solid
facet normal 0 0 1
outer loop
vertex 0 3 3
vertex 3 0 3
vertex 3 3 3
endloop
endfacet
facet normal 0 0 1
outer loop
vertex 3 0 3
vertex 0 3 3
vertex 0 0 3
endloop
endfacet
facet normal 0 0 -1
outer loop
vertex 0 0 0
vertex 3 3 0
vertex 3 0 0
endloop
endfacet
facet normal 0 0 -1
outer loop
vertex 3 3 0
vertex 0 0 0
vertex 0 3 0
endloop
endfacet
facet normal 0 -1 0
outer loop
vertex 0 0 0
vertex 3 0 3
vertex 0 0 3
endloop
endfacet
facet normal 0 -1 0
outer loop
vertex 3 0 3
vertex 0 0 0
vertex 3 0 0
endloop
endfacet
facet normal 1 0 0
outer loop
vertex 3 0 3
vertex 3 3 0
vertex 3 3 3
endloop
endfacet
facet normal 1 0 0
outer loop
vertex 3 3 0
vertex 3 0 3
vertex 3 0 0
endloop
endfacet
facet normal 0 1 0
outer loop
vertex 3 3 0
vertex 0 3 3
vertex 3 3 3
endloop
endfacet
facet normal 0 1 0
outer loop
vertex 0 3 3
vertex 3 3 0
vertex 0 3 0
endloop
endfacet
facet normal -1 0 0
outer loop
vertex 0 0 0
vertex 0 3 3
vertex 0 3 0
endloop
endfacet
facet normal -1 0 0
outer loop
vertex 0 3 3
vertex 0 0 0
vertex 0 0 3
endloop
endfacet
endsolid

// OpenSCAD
// SYMPTOM: a rotate_extrude(file="...") with an unopenable file aborted the WHOLE
//   import. t3d__rotate_extrude-angle opens with
//   `rotate_extrude(file="45", ... angle=360);` and died at parse with
//   `ValueError: Unsupported file extension `, losing the file's other 4 valid
//   rotate_extrude(angle=...) statements (Category C: a hard error, no STEP).
// CAUSE: file="45" is OpenSCAD's deprecated 2D-profile DXF-import form. The
//   importer split "45" -> filen="45", ext="" and called process_import_file,
//   which raises ValueError on the empty/unsupported extension (importCSG.py
//   ~L1014). The exception propagated out of p_rotate_extrude_file and killed
//   the whole document.
// FIX: importCSG.py p_rotate_extrude_file -> wrap process_import_file in
//   try/except (ValueError, FileNotFoundError): warn and render empty, mirroring
//   import()-of-a-missing-file and the childless-rotate_extrude path right above.
//   Commit 65223cb91b.
// EXPECTED (OpenSCAD): rotate_extrude with an unopenable file warns and renders
//   empty; it does not abort the model. Sibling geometry (here cube([3,3,3]),
//   volume 27) is unaffected.
// NOTE: the file="..." form cannot be expressed in modern .scad source (it is a
//   deprecated compiled-CSG construct); compile-and-import the matching .csg
//   `rotate_extrude(file="45", layer="", angle=360, $fn=0, $fa=15, $fs=4);` to
//   reproduce. The cube below stands in for the surviving siblings.
cube([3, 3, 3]);
